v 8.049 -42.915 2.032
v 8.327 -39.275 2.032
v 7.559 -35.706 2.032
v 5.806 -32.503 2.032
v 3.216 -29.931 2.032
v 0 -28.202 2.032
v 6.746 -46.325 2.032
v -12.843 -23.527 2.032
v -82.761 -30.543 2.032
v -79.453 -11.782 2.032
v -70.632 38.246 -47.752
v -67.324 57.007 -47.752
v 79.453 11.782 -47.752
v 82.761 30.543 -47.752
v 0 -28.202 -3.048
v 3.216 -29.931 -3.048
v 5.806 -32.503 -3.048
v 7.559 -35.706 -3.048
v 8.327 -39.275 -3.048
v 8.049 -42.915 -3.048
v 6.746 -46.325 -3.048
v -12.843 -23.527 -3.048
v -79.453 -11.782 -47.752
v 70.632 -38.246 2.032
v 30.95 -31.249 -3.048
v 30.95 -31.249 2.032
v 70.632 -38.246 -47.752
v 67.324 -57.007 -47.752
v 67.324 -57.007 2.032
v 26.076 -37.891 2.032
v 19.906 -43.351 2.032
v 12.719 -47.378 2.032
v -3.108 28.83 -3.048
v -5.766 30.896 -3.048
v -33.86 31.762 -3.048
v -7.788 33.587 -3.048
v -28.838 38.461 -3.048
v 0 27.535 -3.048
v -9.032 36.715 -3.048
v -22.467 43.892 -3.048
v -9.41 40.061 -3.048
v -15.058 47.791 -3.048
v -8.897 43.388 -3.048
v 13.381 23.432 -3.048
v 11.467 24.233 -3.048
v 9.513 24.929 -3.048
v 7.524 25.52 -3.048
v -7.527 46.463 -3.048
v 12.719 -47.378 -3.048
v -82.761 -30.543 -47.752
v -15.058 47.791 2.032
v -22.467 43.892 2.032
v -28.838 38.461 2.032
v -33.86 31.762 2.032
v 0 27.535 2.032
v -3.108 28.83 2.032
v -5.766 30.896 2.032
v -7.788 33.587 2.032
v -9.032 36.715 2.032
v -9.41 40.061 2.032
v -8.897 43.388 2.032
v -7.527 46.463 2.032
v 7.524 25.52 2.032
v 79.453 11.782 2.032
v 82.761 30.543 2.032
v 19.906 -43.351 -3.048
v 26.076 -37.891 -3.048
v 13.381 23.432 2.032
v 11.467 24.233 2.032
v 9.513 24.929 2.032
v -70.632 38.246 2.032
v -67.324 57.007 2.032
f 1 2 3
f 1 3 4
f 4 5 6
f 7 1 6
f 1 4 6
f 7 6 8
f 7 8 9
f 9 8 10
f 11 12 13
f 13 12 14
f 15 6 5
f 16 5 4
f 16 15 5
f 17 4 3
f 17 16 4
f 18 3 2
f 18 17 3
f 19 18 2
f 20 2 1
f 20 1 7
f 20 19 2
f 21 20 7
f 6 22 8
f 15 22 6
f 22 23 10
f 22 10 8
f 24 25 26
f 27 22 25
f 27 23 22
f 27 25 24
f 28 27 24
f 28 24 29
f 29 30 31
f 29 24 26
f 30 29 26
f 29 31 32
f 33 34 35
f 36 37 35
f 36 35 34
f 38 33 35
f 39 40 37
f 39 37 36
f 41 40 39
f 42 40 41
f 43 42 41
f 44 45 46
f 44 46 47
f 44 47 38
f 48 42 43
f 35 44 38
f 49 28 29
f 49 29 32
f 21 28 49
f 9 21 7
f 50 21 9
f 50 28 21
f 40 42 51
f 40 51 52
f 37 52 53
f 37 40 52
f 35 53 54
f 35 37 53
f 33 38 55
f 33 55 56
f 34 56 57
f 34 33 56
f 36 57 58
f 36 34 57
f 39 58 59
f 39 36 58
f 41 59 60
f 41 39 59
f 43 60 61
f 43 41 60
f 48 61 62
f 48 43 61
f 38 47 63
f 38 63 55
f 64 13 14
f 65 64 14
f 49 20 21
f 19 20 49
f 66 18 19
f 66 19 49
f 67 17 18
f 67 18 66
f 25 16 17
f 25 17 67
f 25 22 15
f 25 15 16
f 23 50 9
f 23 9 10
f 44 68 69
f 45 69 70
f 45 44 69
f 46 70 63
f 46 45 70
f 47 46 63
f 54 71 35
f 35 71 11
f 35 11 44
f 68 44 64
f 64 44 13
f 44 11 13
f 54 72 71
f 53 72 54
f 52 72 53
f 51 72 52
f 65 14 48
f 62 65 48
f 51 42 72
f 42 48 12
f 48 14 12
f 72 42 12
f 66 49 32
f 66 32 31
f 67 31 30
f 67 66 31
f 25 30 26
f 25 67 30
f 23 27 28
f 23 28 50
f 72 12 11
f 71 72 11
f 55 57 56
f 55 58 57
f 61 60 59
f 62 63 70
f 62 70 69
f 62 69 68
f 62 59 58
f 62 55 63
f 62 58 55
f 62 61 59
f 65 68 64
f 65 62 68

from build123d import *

# Parameters (mm, degrees)
BOSS_EXTRUDE1_DEPTH        = 3.048
BOSS_EXTRUDE2_DEPTH        = 2.032
BOSS_EXTRUDE2_DEPTH_BACK   = 47.752
BOSS_EXTRUDE2_2_DEPTH      = 2.032
BOSS_EXTRUDE2_2_DEPTH_BACK = 47.752
INTERSECT1_START           = -3.048
INTERSECT1_DEPTH           = 6.096


# Read off the part's stored shape, not the designer's step: Intersect1
with BuildPart() as part:
    # Sketch1 → Boss-Extrude1 (new, symmetric)
    with BuildSketch(Plane.XY):
        with BuildLine():
            ThreePointArc((0, 27.535484012), (-9.412998127, 39.802742006), (0, 52.07))
            Line((0, 52.07), (-11.040532194, 49.111698314))
            ThreePointArc((-11.040532194, 49.111698314), (-39.066320922, 14.192289272), (-14.190605813, -23.03684931))
            Line((-14.190605813, -23.03684931), (0, -28.201807432))
            ThreePointArc((0, -28.201807432), (8.35634418, -40.135903716), (0, -52.07))
            Line((0, -52.07), (10.740686656, -48.160709762))
            ThreePointArc((10.740686656, -48.160709762), (36.144496882, -10.141220984), (7.52373904, 25.519504212))
            Line((7.52373904, 25.519504212), (0, 27.535484012))
        make_face()
        with BuildLine():
            Line((-12.7, 7.332348419), (-1.374815329, 13.870946837))
            ThreePointArc((-1.374815329, 13.870946837), (-0.410875234, 16.198104087), (1.5875, 14.664696837))
            ThreePointArc((1.5875, 14.664696837), (1.533407249, 14.253821603), (1.374815329, 13.870946837))
            Line((1.374815329, 13.870946837), (12.7, 7.332348419))
            Line((12.7, 7.332348419), (12.7, -7.332348419))
            Line((12.7, -7.332348419), (0, -14.664696837))
            Line((0, -14.664696837), (-12.7, -7.332348419))
            Line((-12.7, -7.332348419), (-12.7, 7.332348419))
        make_face(mode=Mode.SUBTRACT)
    extrude(amount=BOSS_EXTRUDE1_DEPTH, both=True)


with BuildPart() as body_2:
    # Sketch2 → Boss-Extrude2 (new, two sides: drawn at the far end of the back side and taken through both)
    with BuildSketch(Plane.XY.offset(-BOSS_EXTRUDE2_DEPTH_BACK)):
        Polygon((-70.631687067, 38.246108065), (79.453014492, 11.782125788), (82.761012277, 30.542713483), (-67.323689282, 57.00669576), align=None)
    extrude(amount=BOSS_EXTRUDE2_DEPTH + BOSS_EXTRUDE2_DEPTH_BACK)


with BuildPart() as body_3:
    # Sketch2 → Boss-Extrude2 2 (new, two sides: drawn at the far end of the back side and taken through both)
    with BuildSketch(Plane.XY.offset(-BOSS_EXTRUDE2_2_DEPTH_BACK)):
        Polygon((-79.453014492, -11.782125788), (70.631687067, -38.246108065), (67.323689282, -57.00669576), (-82.761012277, -30.542713483), align=None)
    extrude(amount=BOSS_EXTRUDE2_2_DEPTH + BOSS_EXTRUDE2_2_DEPTH_BACK)


with BuildPart() as intersect1_tool:
    # Intersect1 outline → Intersect1 (new body)
    with BuildSketch(Plane.XY.offset(INTERSECT1_START)):
        with BuildLine():
            Line((0, 52.07), (-11.040532194, 49.111698314))
            ThreePointArc((-11.040532194, 49.111698314), (-39.066320922, 14.192289271), (-14.190605813, -23.03684931))
            Line((-14.190605813, -23.03684931), (0, -28.201807432))
            ThreePointArc((0, -28.201807432), (8.35634418, -40.135903716), (0, -52.07))
            Line((0, -52.07), (10.740686656, -48.160709762))
            ThreePointArc((10.740686656, -48.160709762), (36.144496882, -10.141220984), (7.52373904, 25.519504212))
            Line((7.52373904, 25.519504212), (0, 27.535484012))
            ThreePointArc((0, 27.535484012), (-9.412998127, 39.802742006), (0, 52.07))
        make_face()
        with BuildLine():
            Line((-12.7, 7.332348419), (-1.374815329, 13.870946837))
            ThreePointArc((-1.374815329, 13.870946837), (0, 16.252196837), (1.374815329, 13.870946837))
            Line((1.374815329, 13.870946837), (12.7, 7.332348419))
            Line((12.7, 7.332348419), (12.7, -7.332348419))
            Line((12.7, -7.332348419), (0, -14.664696837))
            Line((0, -14.664696837), (-12.7, -7.332348419))
            Line((-12.7, -7.332348419), (-12.7, 7.332348419))
        make_face(mode=Mode.SUBTRACT)
    extrude(amount=INTERSECT1_DEPTH)


with BuildPart() as part_1:
    add(part.part)

    # Intersect1: cut by intersect1_tool
    add(intersect1_tool.part, mode=Mode.SUBTRACT)


with BuildPart() as body_2_1:
    add(body_2.part)

    # Intersect1: cut by intersect1_tool
    add(intersect1_tool.part, mode=Mode.SUBTRACT)


with BuildPart() as body_3_1:
    add(body_3.part)

    # Intersect1: cut by intersect1_tool
    add(intersect1_tool.part, mode=Mode.SUBTRACT)


solid = Compound([body_2_1.part, body_3_1.part])
